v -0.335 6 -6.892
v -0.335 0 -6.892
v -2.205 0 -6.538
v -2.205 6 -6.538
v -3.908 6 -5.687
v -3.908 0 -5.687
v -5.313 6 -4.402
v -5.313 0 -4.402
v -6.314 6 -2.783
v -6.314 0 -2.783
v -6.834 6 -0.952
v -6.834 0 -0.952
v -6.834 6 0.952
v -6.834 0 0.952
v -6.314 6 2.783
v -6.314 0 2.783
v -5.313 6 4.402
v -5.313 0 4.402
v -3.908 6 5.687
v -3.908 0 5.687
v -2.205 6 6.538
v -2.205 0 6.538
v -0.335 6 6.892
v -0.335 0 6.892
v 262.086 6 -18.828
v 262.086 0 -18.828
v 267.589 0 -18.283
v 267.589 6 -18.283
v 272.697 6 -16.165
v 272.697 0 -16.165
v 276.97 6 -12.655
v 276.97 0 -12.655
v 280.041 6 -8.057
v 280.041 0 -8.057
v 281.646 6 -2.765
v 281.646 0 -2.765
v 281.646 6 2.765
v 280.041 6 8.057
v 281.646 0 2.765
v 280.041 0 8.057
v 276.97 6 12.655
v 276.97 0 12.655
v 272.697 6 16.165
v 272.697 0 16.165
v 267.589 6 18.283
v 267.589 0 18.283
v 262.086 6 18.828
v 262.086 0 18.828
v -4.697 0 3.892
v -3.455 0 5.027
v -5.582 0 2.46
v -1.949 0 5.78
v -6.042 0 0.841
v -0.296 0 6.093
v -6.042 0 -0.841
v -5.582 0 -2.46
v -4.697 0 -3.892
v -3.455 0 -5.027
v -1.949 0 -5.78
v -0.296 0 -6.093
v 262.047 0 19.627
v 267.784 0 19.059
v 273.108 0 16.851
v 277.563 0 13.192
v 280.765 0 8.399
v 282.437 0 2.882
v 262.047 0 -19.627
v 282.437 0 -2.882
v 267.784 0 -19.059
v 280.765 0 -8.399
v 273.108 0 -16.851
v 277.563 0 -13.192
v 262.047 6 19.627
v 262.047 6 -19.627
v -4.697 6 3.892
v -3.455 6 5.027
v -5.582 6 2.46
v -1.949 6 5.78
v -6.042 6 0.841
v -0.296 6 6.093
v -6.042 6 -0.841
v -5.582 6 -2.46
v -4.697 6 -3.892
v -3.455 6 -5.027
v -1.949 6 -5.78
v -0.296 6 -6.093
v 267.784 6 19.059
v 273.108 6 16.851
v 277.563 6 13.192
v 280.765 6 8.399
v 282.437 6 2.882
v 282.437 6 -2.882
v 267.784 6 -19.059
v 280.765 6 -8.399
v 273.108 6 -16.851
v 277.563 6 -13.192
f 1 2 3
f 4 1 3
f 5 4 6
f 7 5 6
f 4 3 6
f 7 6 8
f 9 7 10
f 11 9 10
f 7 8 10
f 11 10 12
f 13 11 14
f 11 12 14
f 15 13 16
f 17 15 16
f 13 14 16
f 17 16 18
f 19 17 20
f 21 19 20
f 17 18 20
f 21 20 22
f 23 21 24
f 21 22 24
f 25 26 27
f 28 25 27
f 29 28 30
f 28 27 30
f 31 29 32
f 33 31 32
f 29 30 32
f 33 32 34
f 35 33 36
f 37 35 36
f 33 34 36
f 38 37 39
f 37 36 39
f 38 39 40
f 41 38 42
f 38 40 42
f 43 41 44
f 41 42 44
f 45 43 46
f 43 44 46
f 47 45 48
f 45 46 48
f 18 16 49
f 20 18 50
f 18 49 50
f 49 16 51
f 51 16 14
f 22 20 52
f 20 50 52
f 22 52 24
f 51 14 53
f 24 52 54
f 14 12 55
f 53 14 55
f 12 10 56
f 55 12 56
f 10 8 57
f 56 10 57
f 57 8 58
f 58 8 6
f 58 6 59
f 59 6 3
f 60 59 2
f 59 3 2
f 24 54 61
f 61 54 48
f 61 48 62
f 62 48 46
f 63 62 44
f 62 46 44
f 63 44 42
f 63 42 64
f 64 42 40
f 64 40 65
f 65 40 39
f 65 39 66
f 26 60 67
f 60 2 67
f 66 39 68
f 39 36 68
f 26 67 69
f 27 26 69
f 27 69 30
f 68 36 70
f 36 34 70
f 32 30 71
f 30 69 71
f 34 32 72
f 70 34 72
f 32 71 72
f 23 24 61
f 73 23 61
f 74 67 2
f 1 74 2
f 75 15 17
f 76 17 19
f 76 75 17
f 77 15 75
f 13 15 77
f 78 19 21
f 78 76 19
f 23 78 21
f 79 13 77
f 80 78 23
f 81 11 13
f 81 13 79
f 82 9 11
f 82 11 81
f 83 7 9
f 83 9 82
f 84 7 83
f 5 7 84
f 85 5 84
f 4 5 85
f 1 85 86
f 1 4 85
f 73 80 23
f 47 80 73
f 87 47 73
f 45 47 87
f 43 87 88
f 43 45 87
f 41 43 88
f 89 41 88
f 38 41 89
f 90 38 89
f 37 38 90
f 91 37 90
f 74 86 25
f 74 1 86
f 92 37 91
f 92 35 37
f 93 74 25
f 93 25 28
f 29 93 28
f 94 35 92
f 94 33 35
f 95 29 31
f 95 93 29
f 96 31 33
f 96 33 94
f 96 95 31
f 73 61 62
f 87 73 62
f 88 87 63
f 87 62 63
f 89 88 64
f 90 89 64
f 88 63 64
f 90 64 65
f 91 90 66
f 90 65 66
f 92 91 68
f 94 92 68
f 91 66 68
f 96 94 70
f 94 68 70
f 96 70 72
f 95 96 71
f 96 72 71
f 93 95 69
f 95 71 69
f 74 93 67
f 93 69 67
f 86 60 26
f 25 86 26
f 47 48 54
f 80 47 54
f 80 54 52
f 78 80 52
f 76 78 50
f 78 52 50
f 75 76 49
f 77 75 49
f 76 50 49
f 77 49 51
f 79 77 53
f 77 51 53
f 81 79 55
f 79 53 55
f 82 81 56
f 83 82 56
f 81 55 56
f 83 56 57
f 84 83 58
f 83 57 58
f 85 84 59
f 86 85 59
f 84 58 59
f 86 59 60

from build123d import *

# Parameters (mm, degrees)
BOSS_EXTRUDE1_DEPTH = 6


with BuildPart() as part:
    # Sketch1 → Boss-Extrude1 (new body)
    with BuildSketch(Plane(origin=(0, 0, 0), x_dir=(1, 0, 0), z_dir=(0, 1, 0))):
        with BuildLine():
            Line((-0.334505703, -6.891886965), (262.047385932, -19.626895486))
            ThreePointArc((262.047385932, -19.626895486), (282.65, 0), (262.047385932, 19.626895486))
            Line((262.047385932, 19.626895486), (-0.334505703, 6.891886965))
            ThreePointArc((-0.334505703, 6.891886965), (-6.9, 0), (-0.334505703, -6.891886965))
        make_face()
        with BuildLine():
            Line((-0.295722433, 6.092827606), (262.086169202, 18.827836128))
            ThreePointArc((262.086169202, 18.827836128), (281.85, 0), (262.086169202, -18.827836128))
            Line((262.086169202, -18.827836128), (-0.295722433, -6.092827606))
            ThreePointArc((-0.295722433, -6.092827606), (-6.1, 0), (-0.295722433, 6.092827606))
        make_face(mode=Mode.SUBTRACT)
    extrude(amount=BOSS_EXTRUDE1_DEPTH)


solid = part.part
